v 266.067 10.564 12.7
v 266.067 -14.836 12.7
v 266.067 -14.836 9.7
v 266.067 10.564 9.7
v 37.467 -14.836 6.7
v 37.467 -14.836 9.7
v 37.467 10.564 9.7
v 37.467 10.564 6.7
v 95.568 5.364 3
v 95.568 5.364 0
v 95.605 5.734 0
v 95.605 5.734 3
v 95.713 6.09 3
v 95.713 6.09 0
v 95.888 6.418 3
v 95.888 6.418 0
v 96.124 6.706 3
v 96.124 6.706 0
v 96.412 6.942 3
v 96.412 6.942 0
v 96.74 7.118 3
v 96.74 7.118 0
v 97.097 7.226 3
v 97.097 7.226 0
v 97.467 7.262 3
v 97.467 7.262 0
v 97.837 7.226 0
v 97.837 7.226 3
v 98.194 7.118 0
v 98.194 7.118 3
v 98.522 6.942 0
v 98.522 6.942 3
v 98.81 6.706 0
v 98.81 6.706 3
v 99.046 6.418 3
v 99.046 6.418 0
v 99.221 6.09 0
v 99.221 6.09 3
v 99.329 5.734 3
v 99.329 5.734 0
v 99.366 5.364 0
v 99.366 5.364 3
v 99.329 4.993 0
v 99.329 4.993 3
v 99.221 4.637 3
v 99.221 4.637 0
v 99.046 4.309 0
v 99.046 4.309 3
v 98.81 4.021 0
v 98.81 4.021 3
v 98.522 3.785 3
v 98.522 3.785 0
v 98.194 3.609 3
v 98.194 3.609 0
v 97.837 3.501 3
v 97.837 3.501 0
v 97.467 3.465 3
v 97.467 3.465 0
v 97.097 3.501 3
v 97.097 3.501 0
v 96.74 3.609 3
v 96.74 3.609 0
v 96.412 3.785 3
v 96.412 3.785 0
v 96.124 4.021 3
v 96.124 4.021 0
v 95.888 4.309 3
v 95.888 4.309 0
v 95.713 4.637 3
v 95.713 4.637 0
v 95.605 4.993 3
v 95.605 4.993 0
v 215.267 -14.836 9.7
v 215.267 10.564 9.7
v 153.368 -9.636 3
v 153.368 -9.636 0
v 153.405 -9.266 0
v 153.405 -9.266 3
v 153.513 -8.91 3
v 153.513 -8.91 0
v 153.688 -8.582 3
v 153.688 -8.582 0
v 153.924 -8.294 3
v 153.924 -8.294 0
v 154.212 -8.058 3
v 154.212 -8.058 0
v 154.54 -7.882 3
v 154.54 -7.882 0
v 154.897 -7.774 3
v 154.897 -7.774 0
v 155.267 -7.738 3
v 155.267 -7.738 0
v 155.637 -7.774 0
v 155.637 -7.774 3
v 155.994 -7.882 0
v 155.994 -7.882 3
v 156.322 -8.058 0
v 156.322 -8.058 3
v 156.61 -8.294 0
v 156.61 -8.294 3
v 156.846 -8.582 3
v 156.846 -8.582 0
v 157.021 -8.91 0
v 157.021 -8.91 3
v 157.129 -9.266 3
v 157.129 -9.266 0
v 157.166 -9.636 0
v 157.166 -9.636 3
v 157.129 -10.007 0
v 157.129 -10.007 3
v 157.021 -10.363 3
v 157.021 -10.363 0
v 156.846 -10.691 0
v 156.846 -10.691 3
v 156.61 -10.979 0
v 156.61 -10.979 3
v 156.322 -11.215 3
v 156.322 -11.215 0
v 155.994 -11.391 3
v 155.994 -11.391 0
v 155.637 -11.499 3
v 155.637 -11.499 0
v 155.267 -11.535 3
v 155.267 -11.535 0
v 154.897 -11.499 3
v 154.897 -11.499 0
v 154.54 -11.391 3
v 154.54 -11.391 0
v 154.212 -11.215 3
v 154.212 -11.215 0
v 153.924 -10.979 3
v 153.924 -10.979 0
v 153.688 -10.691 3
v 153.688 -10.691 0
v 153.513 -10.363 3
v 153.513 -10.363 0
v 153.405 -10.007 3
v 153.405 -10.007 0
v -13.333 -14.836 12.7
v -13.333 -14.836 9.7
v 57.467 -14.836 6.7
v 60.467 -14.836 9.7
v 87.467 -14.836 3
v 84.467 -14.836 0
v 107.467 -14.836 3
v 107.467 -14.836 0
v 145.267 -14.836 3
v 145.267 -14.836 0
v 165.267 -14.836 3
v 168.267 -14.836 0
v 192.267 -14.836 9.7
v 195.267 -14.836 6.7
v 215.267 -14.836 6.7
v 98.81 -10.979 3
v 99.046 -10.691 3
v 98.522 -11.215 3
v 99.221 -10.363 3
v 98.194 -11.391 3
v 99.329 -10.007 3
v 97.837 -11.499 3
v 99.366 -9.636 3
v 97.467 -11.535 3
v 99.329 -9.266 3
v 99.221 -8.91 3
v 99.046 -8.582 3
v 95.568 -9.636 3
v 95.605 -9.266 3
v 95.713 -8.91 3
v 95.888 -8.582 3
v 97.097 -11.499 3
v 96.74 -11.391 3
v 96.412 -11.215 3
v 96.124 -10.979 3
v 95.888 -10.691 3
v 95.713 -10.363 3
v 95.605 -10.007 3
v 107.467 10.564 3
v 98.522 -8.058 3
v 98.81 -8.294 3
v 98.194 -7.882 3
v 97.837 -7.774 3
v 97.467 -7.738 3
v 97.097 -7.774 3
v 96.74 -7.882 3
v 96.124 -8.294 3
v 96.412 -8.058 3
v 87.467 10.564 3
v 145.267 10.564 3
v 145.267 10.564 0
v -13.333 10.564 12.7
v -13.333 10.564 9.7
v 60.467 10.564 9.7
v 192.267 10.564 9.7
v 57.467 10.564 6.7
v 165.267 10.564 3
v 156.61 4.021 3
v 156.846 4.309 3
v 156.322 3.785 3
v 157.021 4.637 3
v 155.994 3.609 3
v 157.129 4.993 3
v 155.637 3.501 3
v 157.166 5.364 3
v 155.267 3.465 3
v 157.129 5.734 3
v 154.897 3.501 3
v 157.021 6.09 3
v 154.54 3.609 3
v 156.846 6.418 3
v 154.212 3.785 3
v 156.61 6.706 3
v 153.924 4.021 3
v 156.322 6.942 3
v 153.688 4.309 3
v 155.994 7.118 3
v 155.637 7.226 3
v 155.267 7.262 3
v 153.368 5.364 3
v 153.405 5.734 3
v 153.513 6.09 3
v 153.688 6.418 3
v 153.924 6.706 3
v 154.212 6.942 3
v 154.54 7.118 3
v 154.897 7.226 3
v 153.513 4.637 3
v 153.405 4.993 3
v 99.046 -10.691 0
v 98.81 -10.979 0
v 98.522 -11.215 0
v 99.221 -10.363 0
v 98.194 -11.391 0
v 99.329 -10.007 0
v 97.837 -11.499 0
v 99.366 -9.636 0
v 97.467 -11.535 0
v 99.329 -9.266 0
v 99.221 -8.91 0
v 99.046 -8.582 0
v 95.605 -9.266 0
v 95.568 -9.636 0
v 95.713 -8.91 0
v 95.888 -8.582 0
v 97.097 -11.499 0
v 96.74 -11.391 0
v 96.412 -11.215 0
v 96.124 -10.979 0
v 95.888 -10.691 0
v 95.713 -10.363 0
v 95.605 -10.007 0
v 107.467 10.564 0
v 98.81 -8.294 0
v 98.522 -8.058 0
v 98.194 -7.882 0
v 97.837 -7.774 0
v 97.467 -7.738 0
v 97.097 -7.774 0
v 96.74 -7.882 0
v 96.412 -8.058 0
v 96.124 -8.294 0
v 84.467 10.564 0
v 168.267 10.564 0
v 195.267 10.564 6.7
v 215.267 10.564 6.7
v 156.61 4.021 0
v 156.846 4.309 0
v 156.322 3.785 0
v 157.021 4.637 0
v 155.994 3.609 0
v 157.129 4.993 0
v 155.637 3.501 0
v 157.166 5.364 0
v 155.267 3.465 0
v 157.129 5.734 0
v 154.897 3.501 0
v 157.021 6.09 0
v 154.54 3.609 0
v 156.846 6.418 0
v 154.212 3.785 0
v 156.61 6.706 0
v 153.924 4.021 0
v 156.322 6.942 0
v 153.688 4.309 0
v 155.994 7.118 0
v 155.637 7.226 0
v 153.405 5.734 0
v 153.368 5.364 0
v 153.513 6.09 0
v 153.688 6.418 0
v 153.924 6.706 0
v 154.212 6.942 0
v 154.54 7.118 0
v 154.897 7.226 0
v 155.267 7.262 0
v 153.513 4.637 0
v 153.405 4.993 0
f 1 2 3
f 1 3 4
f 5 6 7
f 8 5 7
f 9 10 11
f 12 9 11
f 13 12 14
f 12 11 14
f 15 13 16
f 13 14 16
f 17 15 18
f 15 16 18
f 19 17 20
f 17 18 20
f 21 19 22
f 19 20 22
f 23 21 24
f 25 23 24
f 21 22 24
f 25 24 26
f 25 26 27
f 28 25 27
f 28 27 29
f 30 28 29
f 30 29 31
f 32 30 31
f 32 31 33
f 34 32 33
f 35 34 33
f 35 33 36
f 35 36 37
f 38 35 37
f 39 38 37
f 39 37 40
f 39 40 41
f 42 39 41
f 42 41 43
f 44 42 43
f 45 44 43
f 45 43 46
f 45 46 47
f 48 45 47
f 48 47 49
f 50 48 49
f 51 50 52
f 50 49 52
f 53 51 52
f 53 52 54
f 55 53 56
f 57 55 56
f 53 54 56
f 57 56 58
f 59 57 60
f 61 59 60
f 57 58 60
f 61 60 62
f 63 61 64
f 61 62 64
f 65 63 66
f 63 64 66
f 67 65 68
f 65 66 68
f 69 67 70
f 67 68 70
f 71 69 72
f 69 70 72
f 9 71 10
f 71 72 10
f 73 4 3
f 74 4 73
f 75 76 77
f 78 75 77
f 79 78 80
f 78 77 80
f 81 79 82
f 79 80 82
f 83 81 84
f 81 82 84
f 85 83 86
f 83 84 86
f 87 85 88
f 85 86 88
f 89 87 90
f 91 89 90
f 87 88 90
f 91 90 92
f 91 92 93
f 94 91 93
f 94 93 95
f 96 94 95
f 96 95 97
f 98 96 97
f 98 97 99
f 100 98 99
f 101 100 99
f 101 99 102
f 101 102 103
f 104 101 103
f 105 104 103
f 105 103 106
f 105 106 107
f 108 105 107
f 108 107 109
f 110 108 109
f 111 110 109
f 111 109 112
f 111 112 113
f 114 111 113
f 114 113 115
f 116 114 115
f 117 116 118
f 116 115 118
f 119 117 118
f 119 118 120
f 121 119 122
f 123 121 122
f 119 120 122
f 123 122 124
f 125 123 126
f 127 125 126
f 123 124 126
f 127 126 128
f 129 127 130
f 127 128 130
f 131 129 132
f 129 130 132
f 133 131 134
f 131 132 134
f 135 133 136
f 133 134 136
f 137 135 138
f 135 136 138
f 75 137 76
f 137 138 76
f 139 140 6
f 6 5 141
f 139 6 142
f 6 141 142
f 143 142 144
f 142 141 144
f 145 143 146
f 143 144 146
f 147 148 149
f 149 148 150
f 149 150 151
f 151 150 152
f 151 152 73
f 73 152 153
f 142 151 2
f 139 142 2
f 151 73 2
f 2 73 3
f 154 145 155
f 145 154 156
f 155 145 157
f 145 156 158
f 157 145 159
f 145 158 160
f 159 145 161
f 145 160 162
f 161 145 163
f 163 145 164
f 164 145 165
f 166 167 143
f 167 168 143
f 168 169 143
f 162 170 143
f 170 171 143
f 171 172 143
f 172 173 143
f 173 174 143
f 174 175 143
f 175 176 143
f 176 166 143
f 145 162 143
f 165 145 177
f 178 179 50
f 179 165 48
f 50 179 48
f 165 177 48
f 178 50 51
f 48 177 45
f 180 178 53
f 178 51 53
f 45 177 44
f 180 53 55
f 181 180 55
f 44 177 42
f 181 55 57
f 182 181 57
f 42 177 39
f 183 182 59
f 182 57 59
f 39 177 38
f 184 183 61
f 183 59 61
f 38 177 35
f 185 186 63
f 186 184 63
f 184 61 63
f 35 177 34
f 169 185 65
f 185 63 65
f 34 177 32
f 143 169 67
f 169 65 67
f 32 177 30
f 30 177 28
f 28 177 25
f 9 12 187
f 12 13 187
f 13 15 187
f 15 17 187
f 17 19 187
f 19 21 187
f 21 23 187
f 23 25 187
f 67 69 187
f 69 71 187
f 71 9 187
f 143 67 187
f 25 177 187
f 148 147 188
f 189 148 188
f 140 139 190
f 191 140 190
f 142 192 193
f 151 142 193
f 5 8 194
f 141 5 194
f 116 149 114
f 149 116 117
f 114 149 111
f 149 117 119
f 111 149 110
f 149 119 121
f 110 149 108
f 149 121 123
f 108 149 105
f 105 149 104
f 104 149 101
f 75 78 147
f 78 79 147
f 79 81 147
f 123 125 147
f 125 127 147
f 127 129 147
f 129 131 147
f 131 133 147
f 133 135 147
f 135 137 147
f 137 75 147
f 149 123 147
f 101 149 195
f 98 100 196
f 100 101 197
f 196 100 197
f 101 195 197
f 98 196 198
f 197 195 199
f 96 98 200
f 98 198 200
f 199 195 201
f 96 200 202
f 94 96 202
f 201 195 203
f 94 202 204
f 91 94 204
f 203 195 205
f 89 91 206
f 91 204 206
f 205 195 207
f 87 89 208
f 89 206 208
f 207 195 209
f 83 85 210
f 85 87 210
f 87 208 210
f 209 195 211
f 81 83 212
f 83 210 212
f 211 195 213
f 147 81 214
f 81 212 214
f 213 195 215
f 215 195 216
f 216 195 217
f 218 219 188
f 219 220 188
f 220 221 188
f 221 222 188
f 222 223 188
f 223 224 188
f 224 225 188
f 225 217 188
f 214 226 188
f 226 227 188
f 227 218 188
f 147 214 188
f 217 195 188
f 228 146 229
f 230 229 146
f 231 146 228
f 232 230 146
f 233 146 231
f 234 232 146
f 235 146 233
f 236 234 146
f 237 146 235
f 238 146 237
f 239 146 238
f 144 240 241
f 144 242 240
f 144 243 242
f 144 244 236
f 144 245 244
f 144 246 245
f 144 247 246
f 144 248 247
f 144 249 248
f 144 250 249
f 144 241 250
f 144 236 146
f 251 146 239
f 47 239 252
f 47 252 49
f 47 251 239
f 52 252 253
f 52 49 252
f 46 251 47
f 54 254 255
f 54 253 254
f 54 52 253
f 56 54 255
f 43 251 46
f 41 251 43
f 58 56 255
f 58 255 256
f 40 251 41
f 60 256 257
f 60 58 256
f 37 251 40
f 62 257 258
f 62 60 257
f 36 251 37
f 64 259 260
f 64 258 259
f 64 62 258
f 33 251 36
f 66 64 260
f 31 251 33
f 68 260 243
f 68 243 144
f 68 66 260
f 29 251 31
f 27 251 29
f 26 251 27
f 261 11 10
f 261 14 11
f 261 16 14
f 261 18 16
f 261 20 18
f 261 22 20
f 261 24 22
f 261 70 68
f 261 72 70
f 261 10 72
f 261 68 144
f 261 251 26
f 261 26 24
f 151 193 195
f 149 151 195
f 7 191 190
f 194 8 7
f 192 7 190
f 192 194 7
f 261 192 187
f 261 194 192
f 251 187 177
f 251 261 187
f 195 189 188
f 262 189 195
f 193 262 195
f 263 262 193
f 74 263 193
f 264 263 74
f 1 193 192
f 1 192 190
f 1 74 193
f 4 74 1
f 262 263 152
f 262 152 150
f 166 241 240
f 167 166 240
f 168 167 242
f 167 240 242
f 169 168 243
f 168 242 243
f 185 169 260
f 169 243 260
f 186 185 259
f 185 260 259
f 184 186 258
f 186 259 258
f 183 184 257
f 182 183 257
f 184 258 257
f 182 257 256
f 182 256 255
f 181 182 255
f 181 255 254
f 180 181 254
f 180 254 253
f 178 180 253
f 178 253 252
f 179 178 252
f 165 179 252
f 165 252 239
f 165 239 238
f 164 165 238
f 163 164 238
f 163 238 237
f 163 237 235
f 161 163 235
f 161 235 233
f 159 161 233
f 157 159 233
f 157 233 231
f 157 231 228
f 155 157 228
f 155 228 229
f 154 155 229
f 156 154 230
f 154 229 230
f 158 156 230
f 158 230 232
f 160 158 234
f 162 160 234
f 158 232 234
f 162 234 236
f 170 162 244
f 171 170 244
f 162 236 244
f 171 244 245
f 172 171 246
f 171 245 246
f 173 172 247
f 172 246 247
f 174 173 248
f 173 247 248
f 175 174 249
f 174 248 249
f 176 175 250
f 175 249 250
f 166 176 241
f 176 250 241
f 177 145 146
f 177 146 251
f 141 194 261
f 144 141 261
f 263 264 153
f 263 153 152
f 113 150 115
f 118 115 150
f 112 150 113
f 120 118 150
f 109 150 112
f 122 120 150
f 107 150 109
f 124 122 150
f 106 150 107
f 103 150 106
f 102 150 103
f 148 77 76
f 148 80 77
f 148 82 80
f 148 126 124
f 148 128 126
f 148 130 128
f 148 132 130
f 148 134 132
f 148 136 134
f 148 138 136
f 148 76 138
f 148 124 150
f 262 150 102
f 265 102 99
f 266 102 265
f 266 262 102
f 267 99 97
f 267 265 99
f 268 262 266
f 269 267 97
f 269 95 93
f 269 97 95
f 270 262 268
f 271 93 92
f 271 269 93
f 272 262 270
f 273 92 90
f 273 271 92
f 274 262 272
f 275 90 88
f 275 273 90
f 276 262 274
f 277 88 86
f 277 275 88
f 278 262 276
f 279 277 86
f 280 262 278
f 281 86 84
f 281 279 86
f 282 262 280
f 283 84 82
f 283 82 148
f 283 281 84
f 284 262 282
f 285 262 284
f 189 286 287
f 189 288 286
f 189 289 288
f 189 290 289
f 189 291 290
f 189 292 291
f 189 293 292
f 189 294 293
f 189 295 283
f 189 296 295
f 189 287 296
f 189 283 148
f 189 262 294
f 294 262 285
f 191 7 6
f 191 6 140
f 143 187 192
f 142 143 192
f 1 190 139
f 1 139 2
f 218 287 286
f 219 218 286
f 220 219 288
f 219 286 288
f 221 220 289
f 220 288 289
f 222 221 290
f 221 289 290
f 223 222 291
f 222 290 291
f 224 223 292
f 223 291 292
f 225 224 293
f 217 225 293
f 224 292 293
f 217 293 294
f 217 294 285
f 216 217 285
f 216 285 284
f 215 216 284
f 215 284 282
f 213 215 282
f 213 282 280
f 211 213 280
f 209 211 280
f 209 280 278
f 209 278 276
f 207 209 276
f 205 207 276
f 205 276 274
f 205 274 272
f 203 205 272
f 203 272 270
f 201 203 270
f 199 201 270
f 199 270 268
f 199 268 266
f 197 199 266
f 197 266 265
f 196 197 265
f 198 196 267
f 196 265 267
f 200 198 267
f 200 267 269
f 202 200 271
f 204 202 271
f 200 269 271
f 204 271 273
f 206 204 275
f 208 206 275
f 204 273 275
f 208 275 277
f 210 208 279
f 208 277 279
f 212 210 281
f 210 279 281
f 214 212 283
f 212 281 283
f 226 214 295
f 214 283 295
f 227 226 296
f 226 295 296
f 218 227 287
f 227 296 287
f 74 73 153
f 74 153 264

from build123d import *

# Parameters (mm, degrees)
SKETCH1_W                 = 304.8
SKETCH1_H                 = 25.4
BOSS_EXTRUDE2_DEPTH       = 12.7
FILLET1_R                 = 12.7
CUT_EXTRUDE3_DEPTH        = 281.209703849
SKETCH8_W                 = 70
SKETCH8_H                 = 25.4
BOSS_EXTRUDE3_DEPTH       = 9.7
CUT_EXTRUDE4_DEPTH        = 281.209703849
CUT_EXTRUDE5_DEPTH        = 281.209703849
SKETCH13_W                = 12.7
SKETCH13_H                = 25.4
CUT_EXTRUDE7_DEPTH        = 280.450243045
F_6_CLEARANCE_HOLE1_D     = 3.7973
F_6_CLEARANCE_HOLE1_DEPTH = 3


with BuildPart() as part:
    # Sketch1 → Boss-Extrude2 (new body)
    with BuildSketch(Plane.XY):
        with Locations((126.366978193, -2.136448598)):
            Rectangle(SKETCH1_W, SKETCH1_H)
    extrude(amount=BOSS_EXTRUDE2_DEPTH)

    # Fillet1
    fillet1_edges = [part.edges().sort_by_distance(p)[0] for p in [
        (-26.033021807, -2.136448598, 12.7),
        (278.766978193, -2.136448598, 12.7),
    ]]
    fillet(fillet1_edges, radius=FILLET1_R - 0.0001)  # a hair under: the kernel refuses the full size

    # Sketch6 → Cut-Extrude3 (cut, through all)
    with BuildSketch(Plane(origin=(0, 10.563551402, 0), x_dir=(1, 0, 0), z_dir=(0, 1, 0))):
        with BuildLine():
            Line((-23.033021807, 0), (275.766978193, 0))
            ThreePointArc((275.766978193, 0), (272.925913971, -6.858935778), (266.066978193, -9.7))
            Line((266.066978193, -9.7), (-13.333021807, -9.7))
            ThreePointArc((-13.333021807, -9.7), (-20.191957584, -6.858935778), (-23.033021807, 0))
        make_face()
    extrude(amount=-CUT_EXTRUDE3_DEPTH, mode=Mode.SUBTRACT)

    # Sketch8 → Boss-Extrude3 (add)
    with BuildSketch(Plane(origin=(0, 0, 9.7), x_dir=(-1, 0, 0), z_dir=(0, 0, -1))):
        with Locations((-180.266978193, -2.136448598)):
            Rectangle(SKETCH8_W, SKETCH8_H)
        with Locations((-72.466978193, -2.136448598)):
            Rectangle(SKETCH8_W, SKETCH8_H)
    extrude(amount=BOSS_EXTRUDE3_DEPTH)

    # Sketch9 → Cut-Extrude4 (cut, through all)
    with BuildSketch(Plane(origin=(0, 10.563551402, 0), x_dir=(1, 0, 0), z_dir=(0, 1, 0))):
        Polygon((145.266978193, -9.7), (165.266978193, -9.7), (192.266978193, -9.7), (165.266978193, -3), (145.266978193, -3), align=None)
        Polygon((215.266978193, -6.7), (195.266978193, -6.7), (168.266978193, 0), (215.266978193, 0), align=None)
    extrude(amount=-CUT_EXTRUDE4_DEPTH, mode=Mode.SUBTRACT)

    # Sketch12 → Cut-Extrude5 (cut, through all)
    with BuildSketch(Plane(origin=(0, 10.563551402, 0), x_dir=(1, 0, 0), z_dir=(0, 1, 0))):
        Polygon((107.466978193, -9.7), (107.466978193, -3), (87.466978193, -3), (60.466978193, -9.7), align=None)
        Polygon((37.466978193, -6.7), (57.466978193, -6.7), (84.466978193, 0), (37.466978193, 0), align=None)
    extrude(amount=-CUT_EXTRUDE5_DEPTH, mode=Mode.SUBTRACT)

    # Sketch13 → Cut-Extrude7 (cut, through all)
    with BuildSketch(Plane.XY.offset(12.7)):
        with Locations((-19.683021807, -2.136448598)):
            Rectangle(SKETCH13_W, SKETCH13_H)
        with Locations((272.416978193, -2.136448598)):
            Rectangle(SKETCH13_W, SKETCH13_H)
    extrude(amount=-CUT_EXTRUDE7_DEPTH, mode=Mode.SUBTRACT)

    # #6 Clearance Hole1
    with Locations(Plane.XY.offset(3)):
        with Locations((97.466978193, 5.363551402), (97.466978193, -9.636448598), (155.266978193, -9.636448598), (155.266978193, 5.363551402)):
            Hole(F_6_CLEARANCE_HOLE1_D / 2, depth=F_6_CLEARANCE_HOLE1_DEPTH)


solid = part.part
